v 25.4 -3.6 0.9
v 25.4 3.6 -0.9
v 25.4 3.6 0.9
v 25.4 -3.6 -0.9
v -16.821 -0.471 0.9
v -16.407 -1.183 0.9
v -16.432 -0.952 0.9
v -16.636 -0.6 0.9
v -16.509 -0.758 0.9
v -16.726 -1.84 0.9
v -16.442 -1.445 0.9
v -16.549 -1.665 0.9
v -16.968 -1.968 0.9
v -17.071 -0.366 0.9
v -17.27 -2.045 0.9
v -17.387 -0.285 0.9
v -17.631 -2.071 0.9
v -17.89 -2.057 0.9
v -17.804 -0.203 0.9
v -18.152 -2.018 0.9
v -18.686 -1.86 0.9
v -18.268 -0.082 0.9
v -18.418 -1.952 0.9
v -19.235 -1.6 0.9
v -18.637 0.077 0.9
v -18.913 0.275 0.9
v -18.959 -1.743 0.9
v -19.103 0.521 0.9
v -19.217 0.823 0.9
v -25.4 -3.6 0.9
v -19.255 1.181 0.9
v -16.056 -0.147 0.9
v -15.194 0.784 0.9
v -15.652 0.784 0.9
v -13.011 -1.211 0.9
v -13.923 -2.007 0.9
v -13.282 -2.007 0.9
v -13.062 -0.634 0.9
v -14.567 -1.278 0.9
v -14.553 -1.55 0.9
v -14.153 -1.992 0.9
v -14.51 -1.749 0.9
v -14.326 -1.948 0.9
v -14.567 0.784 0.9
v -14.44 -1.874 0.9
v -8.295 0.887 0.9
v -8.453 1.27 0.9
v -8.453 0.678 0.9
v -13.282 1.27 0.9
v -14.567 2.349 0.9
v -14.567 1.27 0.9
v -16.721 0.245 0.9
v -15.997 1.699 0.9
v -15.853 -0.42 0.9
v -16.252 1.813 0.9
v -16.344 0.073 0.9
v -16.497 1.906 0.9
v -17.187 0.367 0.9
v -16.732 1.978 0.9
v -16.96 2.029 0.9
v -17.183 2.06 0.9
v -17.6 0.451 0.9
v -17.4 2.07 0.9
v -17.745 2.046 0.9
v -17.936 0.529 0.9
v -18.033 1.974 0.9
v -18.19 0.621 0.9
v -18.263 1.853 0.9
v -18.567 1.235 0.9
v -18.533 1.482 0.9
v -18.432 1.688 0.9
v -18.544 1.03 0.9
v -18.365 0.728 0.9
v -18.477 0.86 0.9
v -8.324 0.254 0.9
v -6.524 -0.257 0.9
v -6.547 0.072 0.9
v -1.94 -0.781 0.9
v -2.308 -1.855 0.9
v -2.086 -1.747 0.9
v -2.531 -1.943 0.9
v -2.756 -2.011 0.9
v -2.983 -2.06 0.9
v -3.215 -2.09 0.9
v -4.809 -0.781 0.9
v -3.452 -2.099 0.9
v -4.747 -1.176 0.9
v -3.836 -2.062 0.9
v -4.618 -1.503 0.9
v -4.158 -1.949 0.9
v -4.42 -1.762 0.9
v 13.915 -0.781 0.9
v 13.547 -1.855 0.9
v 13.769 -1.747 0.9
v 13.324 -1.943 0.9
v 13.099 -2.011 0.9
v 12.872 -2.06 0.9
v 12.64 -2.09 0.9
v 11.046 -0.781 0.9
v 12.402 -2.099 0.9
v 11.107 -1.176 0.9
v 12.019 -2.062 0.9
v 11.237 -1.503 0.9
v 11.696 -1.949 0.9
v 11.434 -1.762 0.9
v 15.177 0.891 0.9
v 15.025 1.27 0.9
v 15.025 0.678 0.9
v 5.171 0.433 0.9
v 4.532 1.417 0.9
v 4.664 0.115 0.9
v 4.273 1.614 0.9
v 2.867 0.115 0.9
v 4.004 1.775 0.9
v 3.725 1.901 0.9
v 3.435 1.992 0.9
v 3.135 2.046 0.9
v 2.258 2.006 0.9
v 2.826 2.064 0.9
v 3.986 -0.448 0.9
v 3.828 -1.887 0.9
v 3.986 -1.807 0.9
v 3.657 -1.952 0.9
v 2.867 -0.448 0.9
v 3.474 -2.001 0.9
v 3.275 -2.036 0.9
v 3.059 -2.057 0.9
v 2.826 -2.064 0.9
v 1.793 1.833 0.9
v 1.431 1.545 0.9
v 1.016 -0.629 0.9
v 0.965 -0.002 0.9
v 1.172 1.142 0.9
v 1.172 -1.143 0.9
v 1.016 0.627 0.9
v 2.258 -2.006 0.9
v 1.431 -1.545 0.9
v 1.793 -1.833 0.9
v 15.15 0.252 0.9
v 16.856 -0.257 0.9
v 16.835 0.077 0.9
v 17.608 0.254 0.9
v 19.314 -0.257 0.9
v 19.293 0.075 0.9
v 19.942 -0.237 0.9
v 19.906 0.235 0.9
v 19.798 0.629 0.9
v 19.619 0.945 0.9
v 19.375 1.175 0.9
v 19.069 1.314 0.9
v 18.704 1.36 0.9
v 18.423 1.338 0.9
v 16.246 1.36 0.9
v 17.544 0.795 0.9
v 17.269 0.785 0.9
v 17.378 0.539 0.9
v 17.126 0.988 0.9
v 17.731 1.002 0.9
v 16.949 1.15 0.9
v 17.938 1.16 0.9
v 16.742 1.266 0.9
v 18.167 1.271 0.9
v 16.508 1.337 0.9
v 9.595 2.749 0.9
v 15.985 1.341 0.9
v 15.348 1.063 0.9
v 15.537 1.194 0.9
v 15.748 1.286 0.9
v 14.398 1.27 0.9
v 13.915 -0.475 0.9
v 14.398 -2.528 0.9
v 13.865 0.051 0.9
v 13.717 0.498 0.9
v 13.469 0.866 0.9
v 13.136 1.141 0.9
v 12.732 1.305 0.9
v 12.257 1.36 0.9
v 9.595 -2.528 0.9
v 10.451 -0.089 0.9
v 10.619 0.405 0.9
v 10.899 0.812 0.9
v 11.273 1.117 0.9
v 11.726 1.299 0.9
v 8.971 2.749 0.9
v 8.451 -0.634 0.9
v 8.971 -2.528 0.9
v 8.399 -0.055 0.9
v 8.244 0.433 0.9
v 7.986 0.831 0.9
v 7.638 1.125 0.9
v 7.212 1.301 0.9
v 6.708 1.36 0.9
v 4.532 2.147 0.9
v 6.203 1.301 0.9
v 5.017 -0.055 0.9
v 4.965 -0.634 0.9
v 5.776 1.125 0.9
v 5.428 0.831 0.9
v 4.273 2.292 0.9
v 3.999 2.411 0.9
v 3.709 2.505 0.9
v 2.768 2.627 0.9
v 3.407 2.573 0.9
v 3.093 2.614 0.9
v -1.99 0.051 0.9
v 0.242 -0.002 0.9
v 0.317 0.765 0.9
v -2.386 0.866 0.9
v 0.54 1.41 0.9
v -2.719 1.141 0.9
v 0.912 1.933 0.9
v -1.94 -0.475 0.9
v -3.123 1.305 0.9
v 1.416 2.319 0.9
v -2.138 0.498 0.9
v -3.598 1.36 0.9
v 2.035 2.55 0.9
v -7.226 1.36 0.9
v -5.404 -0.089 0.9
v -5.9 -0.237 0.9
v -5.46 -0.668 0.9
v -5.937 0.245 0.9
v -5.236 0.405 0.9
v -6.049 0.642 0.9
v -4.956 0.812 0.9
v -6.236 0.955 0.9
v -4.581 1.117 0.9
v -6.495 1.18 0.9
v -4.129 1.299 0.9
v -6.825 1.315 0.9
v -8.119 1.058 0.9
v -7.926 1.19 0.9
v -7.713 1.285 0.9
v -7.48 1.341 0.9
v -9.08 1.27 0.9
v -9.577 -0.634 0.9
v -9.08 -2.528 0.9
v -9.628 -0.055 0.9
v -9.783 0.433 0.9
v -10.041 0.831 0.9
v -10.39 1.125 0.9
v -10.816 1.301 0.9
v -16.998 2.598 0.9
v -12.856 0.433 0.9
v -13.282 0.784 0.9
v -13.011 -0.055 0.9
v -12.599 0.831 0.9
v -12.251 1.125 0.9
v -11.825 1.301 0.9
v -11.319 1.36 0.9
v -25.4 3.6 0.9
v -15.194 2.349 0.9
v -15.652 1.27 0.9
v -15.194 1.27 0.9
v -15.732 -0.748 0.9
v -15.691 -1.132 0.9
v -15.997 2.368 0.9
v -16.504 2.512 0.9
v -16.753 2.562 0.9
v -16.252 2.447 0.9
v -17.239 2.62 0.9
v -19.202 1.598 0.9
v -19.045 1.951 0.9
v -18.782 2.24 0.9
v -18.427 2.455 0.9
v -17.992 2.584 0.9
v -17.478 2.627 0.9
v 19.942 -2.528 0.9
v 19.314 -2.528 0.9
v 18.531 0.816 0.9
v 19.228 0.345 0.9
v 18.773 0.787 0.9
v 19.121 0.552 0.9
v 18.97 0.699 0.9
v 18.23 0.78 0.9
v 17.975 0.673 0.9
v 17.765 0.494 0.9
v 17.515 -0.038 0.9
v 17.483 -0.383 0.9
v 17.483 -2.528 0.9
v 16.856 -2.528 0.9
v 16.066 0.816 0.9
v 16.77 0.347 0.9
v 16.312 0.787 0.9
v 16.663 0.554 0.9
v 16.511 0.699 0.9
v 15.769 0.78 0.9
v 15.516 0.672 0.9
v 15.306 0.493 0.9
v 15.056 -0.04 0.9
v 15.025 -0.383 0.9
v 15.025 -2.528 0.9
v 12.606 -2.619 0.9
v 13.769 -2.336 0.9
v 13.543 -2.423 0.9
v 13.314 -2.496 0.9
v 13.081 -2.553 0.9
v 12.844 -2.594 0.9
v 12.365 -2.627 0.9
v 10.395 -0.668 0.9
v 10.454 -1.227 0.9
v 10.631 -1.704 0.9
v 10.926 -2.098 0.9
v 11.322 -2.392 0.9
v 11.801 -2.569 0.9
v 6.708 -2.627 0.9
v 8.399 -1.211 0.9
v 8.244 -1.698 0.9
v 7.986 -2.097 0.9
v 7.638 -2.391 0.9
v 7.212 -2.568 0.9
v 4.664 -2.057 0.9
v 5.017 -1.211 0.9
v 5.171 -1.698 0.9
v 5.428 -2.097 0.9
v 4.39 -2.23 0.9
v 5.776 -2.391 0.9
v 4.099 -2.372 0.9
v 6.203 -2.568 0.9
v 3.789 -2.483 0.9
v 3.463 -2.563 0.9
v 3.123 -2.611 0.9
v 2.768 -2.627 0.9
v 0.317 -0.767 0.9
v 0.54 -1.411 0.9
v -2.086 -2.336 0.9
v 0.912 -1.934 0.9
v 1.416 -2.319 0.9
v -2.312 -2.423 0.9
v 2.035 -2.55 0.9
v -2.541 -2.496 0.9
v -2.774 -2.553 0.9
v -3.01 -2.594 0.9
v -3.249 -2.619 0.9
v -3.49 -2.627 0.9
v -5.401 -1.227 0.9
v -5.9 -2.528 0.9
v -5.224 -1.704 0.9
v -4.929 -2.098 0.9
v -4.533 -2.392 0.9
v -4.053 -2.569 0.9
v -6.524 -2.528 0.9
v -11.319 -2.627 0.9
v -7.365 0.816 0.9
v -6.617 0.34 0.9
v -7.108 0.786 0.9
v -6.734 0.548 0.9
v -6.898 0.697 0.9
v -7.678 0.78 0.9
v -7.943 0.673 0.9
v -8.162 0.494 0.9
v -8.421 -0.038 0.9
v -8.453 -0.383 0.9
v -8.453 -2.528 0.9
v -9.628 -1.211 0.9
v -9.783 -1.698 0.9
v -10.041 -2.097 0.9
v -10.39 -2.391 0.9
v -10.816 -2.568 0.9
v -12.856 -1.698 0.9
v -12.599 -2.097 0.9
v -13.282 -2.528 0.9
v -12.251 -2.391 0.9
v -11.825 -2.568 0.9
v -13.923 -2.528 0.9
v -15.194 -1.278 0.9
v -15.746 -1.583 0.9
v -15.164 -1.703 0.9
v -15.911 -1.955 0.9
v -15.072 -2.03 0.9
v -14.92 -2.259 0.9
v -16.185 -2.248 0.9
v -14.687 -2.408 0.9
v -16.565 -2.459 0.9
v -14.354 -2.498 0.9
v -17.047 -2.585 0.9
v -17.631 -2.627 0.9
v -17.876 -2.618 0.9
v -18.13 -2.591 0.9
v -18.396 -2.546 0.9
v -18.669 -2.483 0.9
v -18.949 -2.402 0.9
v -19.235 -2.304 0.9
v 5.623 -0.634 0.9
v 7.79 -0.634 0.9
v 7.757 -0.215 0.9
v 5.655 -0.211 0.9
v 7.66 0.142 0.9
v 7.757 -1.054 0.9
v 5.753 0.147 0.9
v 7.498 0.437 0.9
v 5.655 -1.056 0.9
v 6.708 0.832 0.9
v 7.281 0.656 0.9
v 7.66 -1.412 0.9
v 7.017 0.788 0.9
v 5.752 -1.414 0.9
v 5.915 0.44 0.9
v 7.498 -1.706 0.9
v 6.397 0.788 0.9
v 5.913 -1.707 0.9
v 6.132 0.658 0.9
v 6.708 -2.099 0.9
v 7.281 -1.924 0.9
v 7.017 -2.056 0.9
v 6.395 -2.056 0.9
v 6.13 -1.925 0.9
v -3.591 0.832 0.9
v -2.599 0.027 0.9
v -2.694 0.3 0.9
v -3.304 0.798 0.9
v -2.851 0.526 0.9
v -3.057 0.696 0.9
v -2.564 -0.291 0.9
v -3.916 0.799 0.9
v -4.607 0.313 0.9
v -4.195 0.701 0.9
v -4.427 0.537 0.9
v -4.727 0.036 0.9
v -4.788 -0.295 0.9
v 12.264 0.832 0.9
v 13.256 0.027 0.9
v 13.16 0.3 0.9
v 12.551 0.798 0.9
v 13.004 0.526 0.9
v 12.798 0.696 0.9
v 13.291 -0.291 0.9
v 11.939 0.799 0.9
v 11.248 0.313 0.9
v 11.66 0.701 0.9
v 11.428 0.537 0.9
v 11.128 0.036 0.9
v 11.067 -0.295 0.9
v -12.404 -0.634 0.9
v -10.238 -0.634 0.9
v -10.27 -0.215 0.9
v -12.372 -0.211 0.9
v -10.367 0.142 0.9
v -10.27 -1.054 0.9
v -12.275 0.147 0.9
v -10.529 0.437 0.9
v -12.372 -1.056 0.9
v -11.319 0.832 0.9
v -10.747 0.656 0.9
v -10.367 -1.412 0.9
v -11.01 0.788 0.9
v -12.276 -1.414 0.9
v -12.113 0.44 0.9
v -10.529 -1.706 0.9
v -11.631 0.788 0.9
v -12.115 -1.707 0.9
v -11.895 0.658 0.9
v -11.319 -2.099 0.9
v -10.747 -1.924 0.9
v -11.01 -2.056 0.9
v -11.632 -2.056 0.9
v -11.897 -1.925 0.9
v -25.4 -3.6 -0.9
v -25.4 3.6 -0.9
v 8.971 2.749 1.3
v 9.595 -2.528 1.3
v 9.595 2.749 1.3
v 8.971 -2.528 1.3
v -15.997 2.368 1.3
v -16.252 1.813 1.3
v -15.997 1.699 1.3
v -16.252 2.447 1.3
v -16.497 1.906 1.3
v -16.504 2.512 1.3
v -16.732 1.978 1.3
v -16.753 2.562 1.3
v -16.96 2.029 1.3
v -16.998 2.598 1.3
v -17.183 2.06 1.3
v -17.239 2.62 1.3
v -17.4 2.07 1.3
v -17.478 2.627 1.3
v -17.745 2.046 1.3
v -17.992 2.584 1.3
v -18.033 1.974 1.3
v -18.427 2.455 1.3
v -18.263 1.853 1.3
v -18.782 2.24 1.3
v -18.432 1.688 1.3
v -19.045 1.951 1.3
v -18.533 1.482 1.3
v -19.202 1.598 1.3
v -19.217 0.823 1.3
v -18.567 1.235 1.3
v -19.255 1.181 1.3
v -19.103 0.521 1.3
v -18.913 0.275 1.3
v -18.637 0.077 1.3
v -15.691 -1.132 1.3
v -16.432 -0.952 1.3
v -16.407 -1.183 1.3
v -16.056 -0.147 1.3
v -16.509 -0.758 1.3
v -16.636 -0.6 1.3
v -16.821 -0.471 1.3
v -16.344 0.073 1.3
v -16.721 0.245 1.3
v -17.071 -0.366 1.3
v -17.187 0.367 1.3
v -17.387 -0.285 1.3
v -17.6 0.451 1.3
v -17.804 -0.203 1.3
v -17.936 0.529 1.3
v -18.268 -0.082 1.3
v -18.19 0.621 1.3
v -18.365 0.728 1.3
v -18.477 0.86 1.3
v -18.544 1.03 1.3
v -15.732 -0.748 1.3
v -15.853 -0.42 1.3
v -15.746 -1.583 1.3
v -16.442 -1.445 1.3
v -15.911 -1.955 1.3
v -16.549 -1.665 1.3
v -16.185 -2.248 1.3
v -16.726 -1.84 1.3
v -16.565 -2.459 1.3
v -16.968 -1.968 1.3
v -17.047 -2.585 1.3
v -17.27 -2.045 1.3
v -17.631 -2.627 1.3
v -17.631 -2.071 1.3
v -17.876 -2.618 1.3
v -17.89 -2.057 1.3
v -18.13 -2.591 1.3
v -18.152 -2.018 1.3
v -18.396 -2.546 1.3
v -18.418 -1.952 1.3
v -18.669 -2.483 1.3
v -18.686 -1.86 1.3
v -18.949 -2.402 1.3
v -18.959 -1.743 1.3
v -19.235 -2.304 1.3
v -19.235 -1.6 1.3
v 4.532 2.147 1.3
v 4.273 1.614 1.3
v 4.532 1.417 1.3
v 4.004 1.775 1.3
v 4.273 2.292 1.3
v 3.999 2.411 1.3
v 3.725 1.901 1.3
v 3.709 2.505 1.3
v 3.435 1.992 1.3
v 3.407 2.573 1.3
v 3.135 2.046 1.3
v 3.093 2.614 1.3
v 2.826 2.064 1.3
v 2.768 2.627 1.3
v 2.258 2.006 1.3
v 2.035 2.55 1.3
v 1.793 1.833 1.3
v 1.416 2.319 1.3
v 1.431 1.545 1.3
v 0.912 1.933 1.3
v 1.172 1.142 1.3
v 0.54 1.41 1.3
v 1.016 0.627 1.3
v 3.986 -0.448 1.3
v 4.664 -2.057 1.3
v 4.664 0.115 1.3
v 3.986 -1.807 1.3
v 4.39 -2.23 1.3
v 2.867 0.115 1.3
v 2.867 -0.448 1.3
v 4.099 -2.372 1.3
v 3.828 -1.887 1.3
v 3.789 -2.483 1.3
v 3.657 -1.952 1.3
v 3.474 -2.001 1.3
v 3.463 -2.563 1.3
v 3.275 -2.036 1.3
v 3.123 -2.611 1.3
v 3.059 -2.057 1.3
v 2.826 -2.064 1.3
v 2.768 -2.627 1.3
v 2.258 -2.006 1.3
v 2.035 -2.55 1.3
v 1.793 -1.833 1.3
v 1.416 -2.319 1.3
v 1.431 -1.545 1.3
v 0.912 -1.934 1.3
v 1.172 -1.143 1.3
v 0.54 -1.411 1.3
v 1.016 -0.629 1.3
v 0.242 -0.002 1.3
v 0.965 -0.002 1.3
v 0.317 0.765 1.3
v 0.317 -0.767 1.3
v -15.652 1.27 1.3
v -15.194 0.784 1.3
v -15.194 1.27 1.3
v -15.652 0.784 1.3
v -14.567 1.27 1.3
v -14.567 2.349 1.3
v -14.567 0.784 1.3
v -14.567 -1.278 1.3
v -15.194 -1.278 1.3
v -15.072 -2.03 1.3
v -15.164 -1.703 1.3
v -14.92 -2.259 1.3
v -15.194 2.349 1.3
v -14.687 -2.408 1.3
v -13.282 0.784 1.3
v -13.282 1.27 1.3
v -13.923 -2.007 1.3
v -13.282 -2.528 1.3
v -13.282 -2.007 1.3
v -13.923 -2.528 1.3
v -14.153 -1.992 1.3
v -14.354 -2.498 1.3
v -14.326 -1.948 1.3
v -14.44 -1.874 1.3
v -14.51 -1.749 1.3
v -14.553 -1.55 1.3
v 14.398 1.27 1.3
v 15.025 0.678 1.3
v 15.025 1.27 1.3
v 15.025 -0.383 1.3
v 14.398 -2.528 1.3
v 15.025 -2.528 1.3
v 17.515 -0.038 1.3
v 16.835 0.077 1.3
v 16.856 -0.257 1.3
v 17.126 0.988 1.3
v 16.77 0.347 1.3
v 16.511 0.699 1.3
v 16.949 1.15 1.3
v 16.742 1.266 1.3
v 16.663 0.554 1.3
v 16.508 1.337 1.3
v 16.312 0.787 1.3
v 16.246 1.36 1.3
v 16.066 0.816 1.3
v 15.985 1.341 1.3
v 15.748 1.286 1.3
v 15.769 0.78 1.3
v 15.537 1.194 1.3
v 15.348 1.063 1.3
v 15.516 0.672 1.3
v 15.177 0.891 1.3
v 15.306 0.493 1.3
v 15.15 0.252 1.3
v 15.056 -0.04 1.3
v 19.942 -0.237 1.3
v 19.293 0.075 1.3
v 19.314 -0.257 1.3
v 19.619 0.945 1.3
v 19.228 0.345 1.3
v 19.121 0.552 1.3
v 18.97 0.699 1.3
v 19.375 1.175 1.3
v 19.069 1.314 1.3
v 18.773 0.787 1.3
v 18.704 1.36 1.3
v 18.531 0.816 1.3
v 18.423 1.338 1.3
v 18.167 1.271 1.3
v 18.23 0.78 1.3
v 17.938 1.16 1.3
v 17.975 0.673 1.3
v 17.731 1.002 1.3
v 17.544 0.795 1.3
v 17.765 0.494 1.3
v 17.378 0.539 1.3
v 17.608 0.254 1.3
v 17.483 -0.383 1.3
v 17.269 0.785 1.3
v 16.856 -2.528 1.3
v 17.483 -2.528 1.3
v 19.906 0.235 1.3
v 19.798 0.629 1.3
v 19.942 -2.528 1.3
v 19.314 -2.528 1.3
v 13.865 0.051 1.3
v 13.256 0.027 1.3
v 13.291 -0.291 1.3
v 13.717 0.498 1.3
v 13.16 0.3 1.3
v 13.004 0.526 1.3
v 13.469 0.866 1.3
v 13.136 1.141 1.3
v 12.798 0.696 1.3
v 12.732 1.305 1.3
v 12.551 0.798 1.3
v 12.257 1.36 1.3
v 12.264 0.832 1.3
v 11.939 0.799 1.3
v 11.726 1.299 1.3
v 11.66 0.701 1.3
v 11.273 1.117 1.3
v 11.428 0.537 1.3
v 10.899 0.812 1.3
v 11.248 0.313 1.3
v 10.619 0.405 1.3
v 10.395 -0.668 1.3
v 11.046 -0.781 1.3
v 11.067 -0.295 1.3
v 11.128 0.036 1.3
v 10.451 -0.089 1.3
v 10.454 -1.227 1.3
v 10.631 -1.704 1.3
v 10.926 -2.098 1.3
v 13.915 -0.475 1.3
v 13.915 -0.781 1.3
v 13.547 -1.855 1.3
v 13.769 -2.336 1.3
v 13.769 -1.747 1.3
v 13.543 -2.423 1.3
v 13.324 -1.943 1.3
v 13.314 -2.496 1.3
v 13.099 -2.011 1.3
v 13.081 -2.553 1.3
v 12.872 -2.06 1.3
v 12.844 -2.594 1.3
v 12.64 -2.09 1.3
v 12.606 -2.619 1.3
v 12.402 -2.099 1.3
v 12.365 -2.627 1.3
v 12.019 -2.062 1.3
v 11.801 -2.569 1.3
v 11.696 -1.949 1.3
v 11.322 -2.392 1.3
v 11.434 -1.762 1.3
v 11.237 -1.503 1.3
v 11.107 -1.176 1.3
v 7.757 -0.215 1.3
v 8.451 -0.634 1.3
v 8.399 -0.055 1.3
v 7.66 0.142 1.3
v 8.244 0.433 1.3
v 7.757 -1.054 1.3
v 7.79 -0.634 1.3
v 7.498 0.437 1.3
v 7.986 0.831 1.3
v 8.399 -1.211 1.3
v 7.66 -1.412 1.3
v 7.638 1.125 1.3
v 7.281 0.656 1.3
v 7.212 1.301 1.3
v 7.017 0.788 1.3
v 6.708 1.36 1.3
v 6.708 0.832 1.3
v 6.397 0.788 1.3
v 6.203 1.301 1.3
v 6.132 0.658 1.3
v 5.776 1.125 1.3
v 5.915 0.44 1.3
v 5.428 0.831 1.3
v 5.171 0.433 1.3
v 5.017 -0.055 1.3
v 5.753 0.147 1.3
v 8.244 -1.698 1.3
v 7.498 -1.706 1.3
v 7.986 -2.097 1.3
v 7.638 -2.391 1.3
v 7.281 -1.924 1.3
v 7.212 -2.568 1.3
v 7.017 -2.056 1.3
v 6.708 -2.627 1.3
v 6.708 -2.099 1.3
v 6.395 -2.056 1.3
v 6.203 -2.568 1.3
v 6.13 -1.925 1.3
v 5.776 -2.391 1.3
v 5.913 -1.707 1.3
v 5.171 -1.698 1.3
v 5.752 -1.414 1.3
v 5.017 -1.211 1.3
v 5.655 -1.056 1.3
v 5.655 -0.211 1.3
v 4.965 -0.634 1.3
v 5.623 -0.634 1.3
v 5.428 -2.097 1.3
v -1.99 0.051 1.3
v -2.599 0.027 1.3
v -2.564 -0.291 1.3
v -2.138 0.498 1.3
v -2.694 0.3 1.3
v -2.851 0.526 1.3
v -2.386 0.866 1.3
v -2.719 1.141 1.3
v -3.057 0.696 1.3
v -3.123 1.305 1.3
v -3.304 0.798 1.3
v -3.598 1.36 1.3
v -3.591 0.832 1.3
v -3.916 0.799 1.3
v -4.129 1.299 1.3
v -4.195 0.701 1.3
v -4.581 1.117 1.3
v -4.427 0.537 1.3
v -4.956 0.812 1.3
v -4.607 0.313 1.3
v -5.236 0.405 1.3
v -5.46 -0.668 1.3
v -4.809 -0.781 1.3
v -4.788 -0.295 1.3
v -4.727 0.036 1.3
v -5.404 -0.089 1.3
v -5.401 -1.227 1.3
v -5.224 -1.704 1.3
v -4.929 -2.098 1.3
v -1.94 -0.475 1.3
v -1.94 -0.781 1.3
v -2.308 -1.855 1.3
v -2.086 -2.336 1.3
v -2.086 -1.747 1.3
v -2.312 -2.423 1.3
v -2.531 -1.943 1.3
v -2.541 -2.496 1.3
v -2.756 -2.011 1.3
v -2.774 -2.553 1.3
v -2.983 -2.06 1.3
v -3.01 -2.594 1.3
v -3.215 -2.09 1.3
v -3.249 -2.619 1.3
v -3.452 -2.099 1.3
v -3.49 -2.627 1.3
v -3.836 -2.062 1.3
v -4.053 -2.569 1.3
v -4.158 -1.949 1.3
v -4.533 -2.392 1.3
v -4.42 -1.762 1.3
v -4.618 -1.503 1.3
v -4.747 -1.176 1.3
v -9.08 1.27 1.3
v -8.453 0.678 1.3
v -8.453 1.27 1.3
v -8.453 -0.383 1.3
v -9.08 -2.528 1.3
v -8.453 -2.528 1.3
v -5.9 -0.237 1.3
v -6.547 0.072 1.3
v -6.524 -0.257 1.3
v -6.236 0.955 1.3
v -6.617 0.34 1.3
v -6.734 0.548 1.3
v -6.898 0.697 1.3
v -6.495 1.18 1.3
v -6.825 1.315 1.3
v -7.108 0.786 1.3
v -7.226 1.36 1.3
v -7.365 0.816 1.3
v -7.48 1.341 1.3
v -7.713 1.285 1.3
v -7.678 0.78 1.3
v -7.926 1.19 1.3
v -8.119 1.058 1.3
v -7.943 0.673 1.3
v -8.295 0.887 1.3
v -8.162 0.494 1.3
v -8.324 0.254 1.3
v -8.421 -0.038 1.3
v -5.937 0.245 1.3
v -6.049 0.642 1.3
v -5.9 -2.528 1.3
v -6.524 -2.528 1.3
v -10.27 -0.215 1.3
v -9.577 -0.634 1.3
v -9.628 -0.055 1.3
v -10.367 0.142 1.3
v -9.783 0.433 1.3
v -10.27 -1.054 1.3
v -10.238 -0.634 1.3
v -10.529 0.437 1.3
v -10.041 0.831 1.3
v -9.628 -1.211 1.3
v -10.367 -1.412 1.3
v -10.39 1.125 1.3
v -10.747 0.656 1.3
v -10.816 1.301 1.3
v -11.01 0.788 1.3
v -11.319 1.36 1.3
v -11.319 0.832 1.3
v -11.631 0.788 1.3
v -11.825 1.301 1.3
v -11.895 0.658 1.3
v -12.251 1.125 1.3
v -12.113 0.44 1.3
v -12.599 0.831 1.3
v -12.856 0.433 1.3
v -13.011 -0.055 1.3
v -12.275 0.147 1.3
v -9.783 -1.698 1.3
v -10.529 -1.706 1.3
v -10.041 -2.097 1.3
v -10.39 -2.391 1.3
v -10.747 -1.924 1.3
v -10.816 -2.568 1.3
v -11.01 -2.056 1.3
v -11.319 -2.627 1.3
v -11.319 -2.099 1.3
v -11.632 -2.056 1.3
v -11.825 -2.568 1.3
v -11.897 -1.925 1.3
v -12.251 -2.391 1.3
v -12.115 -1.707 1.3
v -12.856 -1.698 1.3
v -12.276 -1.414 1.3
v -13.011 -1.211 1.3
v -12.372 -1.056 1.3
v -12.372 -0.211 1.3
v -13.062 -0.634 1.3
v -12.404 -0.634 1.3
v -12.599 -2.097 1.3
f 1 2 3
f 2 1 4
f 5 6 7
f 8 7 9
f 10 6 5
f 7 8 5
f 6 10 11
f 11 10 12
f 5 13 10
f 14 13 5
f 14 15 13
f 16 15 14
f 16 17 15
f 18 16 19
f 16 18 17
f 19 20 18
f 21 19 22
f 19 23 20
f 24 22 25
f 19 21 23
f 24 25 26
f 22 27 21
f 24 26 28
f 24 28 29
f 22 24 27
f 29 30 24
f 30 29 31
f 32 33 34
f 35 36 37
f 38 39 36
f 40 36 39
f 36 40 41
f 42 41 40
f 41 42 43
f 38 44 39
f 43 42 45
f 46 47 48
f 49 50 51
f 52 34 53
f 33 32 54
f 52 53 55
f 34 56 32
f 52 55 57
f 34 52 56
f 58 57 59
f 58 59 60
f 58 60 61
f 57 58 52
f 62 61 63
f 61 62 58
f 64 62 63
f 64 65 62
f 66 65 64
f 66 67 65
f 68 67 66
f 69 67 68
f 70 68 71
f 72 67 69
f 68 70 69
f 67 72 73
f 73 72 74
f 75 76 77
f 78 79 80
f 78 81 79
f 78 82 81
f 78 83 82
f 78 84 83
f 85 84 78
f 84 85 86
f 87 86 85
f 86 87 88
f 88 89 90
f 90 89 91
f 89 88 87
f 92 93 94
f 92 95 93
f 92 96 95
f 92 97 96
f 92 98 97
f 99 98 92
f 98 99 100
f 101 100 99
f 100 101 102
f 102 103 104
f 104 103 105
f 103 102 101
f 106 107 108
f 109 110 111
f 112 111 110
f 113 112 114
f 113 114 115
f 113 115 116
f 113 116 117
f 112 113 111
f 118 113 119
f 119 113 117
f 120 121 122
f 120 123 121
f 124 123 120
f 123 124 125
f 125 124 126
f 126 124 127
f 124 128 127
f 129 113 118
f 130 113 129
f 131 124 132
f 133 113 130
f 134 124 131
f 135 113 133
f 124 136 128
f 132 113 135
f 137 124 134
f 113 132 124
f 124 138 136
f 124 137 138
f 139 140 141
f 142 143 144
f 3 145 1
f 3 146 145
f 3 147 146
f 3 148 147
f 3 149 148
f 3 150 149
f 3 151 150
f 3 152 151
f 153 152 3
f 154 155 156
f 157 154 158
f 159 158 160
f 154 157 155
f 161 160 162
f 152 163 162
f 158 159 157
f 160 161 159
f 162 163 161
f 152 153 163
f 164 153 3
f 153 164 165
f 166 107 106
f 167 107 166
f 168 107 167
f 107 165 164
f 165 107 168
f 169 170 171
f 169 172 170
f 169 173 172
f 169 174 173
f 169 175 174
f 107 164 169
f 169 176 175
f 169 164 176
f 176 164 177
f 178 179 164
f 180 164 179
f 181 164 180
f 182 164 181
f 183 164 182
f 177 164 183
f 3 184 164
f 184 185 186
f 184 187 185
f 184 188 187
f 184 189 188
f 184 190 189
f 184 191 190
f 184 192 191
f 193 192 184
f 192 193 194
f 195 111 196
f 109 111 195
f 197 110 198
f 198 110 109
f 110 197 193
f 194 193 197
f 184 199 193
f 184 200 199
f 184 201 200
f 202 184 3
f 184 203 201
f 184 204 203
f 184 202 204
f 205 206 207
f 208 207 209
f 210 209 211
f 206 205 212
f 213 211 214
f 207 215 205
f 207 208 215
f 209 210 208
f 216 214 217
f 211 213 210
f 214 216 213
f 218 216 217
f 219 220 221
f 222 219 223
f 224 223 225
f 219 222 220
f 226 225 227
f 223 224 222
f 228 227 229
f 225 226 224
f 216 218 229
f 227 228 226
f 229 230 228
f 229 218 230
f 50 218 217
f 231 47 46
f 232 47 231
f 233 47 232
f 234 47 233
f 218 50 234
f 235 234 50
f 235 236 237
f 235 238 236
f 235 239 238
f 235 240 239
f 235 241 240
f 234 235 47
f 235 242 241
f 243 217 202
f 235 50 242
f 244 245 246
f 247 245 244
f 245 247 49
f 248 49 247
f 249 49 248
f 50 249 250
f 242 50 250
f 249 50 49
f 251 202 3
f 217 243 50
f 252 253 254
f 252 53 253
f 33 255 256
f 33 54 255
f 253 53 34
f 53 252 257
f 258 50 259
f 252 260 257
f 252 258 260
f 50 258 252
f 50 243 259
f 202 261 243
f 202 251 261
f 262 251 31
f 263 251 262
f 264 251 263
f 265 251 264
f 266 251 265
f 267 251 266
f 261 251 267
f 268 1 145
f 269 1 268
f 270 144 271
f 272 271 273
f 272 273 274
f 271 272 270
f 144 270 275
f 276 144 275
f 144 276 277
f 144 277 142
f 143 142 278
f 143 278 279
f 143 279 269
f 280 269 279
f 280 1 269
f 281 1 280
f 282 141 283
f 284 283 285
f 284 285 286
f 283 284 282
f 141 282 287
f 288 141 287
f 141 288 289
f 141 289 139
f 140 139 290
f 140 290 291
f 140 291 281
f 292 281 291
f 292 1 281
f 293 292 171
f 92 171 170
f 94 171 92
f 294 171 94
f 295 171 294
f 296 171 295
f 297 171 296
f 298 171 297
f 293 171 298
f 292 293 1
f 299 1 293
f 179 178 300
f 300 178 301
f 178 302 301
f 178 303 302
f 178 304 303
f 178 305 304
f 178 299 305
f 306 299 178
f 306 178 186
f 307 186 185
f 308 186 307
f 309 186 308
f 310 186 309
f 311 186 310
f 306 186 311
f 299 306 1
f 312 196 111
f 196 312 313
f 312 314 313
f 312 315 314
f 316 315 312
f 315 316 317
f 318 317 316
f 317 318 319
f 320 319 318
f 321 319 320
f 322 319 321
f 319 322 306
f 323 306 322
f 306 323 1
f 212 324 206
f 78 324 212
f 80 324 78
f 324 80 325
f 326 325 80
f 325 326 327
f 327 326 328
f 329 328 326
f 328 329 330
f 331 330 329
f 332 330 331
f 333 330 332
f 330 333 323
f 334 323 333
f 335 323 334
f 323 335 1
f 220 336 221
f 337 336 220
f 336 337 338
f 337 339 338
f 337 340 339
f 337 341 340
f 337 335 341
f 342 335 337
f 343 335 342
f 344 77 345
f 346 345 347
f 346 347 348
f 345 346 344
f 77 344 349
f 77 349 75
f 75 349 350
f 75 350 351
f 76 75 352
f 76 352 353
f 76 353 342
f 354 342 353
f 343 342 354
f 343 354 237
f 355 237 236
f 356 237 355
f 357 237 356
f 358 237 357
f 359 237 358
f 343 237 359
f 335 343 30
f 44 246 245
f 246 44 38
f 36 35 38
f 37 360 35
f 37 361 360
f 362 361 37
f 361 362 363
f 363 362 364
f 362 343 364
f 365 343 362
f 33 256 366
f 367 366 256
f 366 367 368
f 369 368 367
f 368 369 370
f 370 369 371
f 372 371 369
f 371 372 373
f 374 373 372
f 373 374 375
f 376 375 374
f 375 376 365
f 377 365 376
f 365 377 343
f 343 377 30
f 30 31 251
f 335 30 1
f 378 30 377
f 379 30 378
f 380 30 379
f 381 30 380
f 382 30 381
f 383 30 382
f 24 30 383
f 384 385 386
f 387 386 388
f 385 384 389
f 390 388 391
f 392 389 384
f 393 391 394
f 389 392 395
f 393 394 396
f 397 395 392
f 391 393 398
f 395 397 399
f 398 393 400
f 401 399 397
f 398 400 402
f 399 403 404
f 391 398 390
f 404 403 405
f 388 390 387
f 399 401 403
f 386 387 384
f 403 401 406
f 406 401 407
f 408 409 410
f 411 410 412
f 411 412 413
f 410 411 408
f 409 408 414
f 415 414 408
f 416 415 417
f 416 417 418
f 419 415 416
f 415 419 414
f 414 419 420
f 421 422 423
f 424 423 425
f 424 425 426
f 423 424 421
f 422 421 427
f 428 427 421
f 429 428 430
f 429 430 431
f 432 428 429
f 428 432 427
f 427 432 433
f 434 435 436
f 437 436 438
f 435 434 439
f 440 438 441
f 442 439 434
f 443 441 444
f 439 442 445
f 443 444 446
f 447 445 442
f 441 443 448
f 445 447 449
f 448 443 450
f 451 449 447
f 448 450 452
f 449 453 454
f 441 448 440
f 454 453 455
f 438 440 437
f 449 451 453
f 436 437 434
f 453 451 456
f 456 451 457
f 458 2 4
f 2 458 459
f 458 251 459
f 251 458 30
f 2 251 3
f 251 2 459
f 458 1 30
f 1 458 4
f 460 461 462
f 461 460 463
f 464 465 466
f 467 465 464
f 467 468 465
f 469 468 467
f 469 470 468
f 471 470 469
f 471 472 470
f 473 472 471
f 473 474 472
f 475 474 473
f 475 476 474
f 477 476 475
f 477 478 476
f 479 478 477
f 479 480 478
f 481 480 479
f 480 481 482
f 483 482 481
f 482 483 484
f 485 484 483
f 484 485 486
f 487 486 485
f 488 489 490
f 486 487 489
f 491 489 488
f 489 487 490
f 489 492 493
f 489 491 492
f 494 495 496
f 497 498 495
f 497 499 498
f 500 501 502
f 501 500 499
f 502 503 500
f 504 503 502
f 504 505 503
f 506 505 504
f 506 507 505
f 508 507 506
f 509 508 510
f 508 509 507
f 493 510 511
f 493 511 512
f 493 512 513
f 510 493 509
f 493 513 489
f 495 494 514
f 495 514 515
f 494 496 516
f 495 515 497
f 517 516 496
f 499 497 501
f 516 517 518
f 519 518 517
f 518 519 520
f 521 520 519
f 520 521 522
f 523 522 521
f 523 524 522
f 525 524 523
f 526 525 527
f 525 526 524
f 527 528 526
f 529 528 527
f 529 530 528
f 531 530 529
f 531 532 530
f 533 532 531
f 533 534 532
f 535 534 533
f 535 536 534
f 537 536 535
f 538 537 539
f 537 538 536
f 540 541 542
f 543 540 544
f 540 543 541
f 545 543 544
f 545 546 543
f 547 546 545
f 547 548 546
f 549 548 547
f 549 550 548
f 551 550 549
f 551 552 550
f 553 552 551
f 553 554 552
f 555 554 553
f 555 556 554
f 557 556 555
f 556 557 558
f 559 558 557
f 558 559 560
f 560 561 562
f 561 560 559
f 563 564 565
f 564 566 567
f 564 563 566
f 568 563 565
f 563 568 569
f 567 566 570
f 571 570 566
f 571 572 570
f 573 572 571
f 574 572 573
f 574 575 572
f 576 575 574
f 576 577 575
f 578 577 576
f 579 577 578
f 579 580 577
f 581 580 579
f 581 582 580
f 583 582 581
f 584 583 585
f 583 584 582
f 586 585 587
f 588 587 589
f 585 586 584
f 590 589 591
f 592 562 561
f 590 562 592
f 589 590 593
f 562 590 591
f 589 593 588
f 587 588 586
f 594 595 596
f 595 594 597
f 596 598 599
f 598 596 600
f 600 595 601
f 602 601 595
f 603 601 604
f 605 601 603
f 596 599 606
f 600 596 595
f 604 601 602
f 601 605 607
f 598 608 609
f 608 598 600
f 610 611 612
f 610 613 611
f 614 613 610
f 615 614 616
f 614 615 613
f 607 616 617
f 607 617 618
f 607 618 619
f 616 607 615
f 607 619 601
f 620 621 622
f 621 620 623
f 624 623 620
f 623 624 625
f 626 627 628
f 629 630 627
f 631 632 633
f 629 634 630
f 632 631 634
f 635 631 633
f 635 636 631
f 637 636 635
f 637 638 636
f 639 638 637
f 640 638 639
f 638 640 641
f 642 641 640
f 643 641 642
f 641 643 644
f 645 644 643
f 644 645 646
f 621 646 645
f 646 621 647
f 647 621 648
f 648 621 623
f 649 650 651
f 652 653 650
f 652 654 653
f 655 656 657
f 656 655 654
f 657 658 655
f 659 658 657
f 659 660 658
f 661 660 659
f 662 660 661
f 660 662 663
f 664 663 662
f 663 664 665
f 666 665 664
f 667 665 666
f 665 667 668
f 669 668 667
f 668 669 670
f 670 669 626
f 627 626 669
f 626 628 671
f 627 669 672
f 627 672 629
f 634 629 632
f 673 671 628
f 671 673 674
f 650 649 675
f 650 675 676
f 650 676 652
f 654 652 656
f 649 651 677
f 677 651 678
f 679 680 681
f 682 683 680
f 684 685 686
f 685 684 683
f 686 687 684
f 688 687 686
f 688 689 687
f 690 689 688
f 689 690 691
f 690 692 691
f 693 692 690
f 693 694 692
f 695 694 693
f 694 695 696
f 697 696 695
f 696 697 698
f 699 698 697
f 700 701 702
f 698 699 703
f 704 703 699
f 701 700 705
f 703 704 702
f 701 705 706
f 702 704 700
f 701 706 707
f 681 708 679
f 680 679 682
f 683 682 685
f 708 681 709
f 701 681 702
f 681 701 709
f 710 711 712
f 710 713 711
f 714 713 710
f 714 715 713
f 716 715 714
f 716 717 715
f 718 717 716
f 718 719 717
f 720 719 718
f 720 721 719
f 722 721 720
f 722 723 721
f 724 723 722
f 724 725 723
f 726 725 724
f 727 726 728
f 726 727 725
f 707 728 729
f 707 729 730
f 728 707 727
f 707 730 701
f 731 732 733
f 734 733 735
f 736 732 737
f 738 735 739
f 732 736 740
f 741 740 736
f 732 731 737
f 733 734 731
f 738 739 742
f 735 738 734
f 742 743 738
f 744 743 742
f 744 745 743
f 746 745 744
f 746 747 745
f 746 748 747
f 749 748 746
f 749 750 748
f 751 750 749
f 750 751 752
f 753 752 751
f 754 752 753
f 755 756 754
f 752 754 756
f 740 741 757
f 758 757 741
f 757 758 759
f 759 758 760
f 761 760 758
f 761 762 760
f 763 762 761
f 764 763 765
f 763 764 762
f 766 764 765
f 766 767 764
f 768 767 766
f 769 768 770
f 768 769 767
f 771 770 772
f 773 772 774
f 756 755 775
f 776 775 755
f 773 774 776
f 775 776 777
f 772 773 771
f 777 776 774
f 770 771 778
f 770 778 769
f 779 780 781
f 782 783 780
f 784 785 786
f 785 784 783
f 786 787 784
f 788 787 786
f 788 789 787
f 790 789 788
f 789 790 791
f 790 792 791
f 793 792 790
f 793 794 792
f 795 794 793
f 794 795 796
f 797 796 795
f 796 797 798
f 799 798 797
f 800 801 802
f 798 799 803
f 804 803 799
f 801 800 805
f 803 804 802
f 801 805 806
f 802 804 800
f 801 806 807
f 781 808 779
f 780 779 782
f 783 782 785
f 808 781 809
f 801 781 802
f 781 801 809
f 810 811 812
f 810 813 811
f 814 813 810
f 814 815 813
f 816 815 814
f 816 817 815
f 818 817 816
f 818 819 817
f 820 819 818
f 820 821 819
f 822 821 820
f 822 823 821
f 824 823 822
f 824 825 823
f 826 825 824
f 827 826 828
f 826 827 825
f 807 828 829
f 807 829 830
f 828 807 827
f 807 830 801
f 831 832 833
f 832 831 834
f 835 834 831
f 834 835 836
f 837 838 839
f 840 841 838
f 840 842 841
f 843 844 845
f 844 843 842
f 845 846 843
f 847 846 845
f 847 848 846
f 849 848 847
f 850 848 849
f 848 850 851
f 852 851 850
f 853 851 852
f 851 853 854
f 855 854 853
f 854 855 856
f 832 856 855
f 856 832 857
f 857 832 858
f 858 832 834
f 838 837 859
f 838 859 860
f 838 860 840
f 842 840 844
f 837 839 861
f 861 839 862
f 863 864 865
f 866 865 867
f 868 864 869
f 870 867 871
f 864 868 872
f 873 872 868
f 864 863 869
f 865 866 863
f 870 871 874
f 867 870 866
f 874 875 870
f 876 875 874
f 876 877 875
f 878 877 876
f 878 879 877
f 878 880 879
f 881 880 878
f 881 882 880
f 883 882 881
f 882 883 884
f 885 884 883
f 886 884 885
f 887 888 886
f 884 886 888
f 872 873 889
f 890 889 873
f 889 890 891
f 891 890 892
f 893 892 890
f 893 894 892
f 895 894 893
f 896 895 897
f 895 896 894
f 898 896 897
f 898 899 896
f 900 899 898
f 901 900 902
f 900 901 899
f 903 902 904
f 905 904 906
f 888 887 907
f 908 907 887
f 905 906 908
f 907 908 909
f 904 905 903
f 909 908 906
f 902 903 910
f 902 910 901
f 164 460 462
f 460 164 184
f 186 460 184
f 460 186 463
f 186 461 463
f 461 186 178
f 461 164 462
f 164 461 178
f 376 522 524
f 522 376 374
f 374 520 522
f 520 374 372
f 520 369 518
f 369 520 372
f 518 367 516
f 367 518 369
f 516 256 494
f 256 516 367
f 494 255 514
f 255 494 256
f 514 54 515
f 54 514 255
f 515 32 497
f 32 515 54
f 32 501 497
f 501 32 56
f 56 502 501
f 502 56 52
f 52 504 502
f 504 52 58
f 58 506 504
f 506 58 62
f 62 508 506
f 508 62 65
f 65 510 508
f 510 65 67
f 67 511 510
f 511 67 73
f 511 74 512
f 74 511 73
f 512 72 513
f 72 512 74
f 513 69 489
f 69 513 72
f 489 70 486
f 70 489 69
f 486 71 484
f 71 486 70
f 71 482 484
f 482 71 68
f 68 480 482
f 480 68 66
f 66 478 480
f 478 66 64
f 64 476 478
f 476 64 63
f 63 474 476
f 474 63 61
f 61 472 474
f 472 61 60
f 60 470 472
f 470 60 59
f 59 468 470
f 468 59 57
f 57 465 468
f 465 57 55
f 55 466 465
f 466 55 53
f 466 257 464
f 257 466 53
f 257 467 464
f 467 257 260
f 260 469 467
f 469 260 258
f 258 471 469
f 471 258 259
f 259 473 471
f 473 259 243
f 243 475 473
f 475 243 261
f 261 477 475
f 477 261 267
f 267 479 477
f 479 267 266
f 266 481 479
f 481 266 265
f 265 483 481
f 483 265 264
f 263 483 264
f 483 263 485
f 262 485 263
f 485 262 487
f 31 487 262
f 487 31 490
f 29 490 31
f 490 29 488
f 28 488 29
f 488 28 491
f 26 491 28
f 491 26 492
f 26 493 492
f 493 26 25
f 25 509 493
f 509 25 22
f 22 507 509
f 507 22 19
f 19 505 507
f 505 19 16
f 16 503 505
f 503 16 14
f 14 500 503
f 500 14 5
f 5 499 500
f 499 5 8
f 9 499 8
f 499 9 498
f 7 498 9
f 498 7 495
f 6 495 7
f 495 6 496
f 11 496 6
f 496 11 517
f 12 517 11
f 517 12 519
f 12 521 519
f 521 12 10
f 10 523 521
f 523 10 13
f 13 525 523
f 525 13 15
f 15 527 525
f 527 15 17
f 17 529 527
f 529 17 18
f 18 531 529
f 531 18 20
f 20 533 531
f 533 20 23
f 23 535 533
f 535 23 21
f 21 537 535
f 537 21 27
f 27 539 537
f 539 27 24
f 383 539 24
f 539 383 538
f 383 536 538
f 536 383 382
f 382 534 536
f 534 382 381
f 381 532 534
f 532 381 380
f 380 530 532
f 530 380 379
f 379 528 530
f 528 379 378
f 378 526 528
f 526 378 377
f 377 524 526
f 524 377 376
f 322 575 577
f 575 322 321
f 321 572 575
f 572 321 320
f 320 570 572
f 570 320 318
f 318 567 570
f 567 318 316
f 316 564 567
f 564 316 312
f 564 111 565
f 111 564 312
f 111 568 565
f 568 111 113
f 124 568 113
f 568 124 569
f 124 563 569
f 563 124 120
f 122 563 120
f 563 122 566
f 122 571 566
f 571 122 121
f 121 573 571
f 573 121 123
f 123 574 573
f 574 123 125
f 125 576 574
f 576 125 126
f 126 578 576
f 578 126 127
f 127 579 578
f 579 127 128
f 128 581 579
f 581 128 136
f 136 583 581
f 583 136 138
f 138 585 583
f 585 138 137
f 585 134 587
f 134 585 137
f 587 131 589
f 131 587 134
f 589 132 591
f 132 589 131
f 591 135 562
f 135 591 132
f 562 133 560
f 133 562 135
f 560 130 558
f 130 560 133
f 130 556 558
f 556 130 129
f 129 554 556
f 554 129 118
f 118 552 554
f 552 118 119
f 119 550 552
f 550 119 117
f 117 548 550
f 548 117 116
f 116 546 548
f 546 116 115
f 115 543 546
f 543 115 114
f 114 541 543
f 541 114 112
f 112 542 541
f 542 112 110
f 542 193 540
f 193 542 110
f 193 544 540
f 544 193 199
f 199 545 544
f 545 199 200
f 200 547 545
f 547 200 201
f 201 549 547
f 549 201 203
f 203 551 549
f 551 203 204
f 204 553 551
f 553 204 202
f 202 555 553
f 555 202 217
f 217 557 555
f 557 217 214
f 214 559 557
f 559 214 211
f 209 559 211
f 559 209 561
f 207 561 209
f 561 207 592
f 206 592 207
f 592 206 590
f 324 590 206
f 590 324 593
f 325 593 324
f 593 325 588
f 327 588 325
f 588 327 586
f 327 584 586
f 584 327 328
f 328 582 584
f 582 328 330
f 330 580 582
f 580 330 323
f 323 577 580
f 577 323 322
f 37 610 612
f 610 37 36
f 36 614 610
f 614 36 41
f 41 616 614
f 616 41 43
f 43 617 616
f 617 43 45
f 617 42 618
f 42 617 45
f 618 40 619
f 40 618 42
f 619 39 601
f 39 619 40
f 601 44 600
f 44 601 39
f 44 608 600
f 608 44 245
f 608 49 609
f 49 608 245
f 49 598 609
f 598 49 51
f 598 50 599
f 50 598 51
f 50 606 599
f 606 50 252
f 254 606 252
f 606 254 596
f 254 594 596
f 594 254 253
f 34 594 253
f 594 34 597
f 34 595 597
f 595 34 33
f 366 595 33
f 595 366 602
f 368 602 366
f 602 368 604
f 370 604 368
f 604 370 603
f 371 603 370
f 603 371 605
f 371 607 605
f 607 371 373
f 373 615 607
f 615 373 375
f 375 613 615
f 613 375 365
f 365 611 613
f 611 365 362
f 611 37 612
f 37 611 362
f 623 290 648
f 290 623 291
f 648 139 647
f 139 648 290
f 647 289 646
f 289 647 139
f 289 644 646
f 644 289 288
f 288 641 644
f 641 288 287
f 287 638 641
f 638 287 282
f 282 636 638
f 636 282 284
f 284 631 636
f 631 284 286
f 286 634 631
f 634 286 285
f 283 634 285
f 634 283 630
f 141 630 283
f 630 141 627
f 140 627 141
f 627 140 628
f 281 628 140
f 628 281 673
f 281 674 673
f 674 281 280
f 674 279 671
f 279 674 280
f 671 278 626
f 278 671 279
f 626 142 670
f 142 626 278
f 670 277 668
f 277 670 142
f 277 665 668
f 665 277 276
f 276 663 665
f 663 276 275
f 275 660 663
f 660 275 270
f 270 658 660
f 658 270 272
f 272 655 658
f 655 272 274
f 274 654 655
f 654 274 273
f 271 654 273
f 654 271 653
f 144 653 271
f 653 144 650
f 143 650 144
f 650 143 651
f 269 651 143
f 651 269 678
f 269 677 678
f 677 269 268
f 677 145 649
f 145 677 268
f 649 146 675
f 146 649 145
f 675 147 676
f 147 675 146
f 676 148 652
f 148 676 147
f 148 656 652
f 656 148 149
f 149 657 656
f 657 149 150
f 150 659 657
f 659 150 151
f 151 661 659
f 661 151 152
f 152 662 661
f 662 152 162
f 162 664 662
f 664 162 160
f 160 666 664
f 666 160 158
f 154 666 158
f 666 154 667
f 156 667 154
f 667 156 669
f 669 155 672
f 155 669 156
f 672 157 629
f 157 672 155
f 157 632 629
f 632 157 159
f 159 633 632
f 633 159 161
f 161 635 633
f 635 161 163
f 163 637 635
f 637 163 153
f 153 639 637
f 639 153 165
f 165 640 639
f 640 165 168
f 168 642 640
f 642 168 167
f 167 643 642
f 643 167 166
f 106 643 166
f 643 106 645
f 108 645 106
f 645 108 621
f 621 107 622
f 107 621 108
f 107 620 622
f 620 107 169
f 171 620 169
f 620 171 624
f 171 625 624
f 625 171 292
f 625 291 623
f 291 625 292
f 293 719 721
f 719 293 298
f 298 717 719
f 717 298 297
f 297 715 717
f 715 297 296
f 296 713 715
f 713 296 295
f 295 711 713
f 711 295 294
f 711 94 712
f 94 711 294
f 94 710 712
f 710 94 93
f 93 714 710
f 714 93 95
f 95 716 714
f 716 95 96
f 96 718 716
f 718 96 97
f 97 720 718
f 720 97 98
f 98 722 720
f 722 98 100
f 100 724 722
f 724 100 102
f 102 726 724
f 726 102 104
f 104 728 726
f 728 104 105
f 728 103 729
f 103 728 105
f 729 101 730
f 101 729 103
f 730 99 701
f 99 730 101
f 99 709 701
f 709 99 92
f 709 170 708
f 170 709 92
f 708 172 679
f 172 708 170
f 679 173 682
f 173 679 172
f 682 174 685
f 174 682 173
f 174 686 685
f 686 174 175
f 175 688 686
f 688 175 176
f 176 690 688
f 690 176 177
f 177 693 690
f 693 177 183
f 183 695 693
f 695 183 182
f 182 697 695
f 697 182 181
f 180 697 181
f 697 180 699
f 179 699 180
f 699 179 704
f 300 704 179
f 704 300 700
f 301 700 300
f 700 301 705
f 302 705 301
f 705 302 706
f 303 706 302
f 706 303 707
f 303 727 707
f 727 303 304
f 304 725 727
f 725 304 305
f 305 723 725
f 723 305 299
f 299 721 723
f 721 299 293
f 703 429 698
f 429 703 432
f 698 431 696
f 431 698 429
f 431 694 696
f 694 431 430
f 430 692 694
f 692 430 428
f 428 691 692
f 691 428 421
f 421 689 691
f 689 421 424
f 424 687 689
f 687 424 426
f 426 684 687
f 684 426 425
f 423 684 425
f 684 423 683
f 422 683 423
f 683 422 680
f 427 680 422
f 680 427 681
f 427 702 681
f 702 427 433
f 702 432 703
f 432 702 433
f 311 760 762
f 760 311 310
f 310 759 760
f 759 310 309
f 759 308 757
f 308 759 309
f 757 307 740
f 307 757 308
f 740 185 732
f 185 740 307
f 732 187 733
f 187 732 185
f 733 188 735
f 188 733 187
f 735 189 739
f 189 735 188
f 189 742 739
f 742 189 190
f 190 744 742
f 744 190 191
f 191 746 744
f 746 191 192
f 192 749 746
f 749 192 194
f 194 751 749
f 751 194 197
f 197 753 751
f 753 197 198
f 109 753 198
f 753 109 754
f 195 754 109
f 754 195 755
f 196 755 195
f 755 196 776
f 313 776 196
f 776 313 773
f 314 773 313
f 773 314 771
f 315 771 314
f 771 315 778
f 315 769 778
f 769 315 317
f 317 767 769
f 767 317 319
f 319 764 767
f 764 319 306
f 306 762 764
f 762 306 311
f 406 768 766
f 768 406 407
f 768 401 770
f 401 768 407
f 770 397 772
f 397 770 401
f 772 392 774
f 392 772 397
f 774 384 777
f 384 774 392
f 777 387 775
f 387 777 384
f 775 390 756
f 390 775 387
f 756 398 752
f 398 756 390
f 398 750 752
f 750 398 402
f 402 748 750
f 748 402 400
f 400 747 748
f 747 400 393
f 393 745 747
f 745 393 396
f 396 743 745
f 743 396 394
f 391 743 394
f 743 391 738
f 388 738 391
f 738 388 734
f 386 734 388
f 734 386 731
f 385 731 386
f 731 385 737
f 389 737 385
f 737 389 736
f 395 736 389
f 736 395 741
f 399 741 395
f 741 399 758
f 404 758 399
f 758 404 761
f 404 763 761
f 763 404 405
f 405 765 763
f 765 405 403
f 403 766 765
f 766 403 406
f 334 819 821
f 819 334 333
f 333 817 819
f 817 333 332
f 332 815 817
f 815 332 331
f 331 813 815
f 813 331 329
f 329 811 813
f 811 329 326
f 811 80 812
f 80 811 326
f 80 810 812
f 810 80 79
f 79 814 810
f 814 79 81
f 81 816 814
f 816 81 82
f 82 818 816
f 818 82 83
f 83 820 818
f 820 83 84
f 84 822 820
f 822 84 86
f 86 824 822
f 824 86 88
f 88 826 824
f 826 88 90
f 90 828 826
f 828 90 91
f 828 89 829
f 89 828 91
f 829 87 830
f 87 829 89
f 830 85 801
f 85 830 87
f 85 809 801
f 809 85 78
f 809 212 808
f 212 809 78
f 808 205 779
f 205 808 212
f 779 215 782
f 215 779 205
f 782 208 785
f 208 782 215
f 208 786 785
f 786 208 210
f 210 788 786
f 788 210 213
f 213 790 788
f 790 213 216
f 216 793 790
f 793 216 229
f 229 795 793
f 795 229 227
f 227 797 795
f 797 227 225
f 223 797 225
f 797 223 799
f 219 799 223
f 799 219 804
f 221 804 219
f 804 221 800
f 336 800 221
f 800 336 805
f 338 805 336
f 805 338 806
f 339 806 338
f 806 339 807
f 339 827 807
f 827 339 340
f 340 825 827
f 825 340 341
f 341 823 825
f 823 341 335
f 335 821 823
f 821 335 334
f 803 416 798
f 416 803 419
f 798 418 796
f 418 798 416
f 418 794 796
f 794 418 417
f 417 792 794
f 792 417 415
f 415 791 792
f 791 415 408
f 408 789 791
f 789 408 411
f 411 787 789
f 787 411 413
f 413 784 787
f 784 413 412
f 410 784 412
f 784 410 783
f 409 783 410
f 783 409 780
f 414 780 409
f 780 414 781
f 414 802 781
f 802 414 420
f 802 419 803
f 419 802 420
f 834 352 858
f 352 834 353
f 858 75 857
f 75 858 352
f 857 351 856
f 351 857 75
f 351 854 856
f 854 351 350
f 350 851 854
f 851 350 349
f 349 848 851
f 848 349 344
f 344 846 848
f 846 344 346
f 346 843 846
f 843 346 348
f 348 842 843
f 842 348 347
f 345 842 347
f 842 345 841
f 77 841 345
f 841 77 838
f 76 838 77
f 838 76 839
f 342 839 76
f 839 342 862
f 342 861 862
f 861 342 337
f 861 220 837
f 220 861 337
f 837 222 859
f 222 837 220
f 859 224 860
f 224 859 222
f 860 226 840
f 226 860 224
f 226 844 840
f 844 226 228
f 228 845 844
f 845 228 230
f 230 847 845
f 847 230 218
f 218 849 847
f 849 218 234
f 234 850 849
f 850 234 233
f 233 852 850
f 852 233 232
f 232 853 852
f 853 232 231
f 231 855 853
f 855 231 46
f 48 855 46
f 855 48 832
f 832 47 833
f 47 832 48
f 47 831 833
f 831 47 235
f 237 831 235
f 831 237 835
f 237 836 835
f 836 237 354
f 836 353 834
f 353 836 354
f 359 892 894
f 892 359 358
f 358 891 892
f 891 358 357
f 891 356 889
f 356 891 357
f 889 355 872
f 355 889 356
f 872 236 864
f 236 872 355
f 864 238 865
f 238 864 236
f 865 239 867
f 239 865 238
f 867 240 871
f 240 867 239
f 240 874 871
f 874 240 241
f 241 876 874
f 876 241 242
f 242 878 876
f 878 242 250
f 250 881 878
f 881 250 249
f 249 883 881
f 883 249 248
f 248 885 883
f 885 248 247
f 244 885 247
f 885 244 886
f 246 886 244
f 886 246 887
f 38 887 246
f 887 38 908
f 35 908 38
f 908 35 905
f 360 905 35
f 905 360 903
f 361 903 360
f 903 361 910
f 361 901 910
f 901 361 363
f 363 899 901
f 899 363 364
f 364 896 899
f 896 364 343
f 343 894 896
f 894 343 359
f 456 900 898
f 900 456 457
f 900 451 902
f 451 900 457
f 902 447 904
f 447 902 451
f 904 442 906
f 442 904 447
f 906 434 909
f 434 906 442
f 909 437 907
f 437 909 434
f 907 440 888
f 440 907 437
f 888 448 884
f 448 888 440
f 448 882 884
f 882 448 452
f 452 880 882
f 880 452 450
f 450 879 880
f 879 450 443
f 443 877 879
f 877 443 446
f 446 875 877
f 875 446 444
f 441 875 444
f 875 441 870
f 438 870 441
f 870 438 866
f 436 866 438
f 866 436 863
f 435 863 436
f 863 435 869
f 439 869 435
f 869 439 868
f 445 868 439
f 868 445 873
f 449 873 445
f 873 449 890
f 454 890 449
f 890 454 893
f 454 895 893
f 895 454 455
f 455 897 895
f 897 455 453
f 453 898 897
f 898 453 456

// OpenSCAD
module monster_box_name_plate_v1(monster_name, name_plate_width) {

    name_plate_length = 50.8; // initiative_slot_inner_length - 0.7
    name_plate_thickness = 1.8;

    cube(
        size=[
            name_plate_length,
            name_plate_width,
            name_plate_thickness,
        ], center=true
    );
    color("BLACK")
        translate([0, 0, name_plate_thickness / 2])
            linear_extrude(height=0.4)
                text(
                    monster_name,
                    size=5,
                    spacing=0.9,
                    font="pirataone",
                    halign="center",
                    valign="center"
                );
}

monster_name = "Stone Golem";
// full z - 1.2(5) (from initiative_slot_lip_height)
name_plate_width = 7.2; // for 2x standees
monster_box_name_plate_v1(monster_name, name_plate_width);
